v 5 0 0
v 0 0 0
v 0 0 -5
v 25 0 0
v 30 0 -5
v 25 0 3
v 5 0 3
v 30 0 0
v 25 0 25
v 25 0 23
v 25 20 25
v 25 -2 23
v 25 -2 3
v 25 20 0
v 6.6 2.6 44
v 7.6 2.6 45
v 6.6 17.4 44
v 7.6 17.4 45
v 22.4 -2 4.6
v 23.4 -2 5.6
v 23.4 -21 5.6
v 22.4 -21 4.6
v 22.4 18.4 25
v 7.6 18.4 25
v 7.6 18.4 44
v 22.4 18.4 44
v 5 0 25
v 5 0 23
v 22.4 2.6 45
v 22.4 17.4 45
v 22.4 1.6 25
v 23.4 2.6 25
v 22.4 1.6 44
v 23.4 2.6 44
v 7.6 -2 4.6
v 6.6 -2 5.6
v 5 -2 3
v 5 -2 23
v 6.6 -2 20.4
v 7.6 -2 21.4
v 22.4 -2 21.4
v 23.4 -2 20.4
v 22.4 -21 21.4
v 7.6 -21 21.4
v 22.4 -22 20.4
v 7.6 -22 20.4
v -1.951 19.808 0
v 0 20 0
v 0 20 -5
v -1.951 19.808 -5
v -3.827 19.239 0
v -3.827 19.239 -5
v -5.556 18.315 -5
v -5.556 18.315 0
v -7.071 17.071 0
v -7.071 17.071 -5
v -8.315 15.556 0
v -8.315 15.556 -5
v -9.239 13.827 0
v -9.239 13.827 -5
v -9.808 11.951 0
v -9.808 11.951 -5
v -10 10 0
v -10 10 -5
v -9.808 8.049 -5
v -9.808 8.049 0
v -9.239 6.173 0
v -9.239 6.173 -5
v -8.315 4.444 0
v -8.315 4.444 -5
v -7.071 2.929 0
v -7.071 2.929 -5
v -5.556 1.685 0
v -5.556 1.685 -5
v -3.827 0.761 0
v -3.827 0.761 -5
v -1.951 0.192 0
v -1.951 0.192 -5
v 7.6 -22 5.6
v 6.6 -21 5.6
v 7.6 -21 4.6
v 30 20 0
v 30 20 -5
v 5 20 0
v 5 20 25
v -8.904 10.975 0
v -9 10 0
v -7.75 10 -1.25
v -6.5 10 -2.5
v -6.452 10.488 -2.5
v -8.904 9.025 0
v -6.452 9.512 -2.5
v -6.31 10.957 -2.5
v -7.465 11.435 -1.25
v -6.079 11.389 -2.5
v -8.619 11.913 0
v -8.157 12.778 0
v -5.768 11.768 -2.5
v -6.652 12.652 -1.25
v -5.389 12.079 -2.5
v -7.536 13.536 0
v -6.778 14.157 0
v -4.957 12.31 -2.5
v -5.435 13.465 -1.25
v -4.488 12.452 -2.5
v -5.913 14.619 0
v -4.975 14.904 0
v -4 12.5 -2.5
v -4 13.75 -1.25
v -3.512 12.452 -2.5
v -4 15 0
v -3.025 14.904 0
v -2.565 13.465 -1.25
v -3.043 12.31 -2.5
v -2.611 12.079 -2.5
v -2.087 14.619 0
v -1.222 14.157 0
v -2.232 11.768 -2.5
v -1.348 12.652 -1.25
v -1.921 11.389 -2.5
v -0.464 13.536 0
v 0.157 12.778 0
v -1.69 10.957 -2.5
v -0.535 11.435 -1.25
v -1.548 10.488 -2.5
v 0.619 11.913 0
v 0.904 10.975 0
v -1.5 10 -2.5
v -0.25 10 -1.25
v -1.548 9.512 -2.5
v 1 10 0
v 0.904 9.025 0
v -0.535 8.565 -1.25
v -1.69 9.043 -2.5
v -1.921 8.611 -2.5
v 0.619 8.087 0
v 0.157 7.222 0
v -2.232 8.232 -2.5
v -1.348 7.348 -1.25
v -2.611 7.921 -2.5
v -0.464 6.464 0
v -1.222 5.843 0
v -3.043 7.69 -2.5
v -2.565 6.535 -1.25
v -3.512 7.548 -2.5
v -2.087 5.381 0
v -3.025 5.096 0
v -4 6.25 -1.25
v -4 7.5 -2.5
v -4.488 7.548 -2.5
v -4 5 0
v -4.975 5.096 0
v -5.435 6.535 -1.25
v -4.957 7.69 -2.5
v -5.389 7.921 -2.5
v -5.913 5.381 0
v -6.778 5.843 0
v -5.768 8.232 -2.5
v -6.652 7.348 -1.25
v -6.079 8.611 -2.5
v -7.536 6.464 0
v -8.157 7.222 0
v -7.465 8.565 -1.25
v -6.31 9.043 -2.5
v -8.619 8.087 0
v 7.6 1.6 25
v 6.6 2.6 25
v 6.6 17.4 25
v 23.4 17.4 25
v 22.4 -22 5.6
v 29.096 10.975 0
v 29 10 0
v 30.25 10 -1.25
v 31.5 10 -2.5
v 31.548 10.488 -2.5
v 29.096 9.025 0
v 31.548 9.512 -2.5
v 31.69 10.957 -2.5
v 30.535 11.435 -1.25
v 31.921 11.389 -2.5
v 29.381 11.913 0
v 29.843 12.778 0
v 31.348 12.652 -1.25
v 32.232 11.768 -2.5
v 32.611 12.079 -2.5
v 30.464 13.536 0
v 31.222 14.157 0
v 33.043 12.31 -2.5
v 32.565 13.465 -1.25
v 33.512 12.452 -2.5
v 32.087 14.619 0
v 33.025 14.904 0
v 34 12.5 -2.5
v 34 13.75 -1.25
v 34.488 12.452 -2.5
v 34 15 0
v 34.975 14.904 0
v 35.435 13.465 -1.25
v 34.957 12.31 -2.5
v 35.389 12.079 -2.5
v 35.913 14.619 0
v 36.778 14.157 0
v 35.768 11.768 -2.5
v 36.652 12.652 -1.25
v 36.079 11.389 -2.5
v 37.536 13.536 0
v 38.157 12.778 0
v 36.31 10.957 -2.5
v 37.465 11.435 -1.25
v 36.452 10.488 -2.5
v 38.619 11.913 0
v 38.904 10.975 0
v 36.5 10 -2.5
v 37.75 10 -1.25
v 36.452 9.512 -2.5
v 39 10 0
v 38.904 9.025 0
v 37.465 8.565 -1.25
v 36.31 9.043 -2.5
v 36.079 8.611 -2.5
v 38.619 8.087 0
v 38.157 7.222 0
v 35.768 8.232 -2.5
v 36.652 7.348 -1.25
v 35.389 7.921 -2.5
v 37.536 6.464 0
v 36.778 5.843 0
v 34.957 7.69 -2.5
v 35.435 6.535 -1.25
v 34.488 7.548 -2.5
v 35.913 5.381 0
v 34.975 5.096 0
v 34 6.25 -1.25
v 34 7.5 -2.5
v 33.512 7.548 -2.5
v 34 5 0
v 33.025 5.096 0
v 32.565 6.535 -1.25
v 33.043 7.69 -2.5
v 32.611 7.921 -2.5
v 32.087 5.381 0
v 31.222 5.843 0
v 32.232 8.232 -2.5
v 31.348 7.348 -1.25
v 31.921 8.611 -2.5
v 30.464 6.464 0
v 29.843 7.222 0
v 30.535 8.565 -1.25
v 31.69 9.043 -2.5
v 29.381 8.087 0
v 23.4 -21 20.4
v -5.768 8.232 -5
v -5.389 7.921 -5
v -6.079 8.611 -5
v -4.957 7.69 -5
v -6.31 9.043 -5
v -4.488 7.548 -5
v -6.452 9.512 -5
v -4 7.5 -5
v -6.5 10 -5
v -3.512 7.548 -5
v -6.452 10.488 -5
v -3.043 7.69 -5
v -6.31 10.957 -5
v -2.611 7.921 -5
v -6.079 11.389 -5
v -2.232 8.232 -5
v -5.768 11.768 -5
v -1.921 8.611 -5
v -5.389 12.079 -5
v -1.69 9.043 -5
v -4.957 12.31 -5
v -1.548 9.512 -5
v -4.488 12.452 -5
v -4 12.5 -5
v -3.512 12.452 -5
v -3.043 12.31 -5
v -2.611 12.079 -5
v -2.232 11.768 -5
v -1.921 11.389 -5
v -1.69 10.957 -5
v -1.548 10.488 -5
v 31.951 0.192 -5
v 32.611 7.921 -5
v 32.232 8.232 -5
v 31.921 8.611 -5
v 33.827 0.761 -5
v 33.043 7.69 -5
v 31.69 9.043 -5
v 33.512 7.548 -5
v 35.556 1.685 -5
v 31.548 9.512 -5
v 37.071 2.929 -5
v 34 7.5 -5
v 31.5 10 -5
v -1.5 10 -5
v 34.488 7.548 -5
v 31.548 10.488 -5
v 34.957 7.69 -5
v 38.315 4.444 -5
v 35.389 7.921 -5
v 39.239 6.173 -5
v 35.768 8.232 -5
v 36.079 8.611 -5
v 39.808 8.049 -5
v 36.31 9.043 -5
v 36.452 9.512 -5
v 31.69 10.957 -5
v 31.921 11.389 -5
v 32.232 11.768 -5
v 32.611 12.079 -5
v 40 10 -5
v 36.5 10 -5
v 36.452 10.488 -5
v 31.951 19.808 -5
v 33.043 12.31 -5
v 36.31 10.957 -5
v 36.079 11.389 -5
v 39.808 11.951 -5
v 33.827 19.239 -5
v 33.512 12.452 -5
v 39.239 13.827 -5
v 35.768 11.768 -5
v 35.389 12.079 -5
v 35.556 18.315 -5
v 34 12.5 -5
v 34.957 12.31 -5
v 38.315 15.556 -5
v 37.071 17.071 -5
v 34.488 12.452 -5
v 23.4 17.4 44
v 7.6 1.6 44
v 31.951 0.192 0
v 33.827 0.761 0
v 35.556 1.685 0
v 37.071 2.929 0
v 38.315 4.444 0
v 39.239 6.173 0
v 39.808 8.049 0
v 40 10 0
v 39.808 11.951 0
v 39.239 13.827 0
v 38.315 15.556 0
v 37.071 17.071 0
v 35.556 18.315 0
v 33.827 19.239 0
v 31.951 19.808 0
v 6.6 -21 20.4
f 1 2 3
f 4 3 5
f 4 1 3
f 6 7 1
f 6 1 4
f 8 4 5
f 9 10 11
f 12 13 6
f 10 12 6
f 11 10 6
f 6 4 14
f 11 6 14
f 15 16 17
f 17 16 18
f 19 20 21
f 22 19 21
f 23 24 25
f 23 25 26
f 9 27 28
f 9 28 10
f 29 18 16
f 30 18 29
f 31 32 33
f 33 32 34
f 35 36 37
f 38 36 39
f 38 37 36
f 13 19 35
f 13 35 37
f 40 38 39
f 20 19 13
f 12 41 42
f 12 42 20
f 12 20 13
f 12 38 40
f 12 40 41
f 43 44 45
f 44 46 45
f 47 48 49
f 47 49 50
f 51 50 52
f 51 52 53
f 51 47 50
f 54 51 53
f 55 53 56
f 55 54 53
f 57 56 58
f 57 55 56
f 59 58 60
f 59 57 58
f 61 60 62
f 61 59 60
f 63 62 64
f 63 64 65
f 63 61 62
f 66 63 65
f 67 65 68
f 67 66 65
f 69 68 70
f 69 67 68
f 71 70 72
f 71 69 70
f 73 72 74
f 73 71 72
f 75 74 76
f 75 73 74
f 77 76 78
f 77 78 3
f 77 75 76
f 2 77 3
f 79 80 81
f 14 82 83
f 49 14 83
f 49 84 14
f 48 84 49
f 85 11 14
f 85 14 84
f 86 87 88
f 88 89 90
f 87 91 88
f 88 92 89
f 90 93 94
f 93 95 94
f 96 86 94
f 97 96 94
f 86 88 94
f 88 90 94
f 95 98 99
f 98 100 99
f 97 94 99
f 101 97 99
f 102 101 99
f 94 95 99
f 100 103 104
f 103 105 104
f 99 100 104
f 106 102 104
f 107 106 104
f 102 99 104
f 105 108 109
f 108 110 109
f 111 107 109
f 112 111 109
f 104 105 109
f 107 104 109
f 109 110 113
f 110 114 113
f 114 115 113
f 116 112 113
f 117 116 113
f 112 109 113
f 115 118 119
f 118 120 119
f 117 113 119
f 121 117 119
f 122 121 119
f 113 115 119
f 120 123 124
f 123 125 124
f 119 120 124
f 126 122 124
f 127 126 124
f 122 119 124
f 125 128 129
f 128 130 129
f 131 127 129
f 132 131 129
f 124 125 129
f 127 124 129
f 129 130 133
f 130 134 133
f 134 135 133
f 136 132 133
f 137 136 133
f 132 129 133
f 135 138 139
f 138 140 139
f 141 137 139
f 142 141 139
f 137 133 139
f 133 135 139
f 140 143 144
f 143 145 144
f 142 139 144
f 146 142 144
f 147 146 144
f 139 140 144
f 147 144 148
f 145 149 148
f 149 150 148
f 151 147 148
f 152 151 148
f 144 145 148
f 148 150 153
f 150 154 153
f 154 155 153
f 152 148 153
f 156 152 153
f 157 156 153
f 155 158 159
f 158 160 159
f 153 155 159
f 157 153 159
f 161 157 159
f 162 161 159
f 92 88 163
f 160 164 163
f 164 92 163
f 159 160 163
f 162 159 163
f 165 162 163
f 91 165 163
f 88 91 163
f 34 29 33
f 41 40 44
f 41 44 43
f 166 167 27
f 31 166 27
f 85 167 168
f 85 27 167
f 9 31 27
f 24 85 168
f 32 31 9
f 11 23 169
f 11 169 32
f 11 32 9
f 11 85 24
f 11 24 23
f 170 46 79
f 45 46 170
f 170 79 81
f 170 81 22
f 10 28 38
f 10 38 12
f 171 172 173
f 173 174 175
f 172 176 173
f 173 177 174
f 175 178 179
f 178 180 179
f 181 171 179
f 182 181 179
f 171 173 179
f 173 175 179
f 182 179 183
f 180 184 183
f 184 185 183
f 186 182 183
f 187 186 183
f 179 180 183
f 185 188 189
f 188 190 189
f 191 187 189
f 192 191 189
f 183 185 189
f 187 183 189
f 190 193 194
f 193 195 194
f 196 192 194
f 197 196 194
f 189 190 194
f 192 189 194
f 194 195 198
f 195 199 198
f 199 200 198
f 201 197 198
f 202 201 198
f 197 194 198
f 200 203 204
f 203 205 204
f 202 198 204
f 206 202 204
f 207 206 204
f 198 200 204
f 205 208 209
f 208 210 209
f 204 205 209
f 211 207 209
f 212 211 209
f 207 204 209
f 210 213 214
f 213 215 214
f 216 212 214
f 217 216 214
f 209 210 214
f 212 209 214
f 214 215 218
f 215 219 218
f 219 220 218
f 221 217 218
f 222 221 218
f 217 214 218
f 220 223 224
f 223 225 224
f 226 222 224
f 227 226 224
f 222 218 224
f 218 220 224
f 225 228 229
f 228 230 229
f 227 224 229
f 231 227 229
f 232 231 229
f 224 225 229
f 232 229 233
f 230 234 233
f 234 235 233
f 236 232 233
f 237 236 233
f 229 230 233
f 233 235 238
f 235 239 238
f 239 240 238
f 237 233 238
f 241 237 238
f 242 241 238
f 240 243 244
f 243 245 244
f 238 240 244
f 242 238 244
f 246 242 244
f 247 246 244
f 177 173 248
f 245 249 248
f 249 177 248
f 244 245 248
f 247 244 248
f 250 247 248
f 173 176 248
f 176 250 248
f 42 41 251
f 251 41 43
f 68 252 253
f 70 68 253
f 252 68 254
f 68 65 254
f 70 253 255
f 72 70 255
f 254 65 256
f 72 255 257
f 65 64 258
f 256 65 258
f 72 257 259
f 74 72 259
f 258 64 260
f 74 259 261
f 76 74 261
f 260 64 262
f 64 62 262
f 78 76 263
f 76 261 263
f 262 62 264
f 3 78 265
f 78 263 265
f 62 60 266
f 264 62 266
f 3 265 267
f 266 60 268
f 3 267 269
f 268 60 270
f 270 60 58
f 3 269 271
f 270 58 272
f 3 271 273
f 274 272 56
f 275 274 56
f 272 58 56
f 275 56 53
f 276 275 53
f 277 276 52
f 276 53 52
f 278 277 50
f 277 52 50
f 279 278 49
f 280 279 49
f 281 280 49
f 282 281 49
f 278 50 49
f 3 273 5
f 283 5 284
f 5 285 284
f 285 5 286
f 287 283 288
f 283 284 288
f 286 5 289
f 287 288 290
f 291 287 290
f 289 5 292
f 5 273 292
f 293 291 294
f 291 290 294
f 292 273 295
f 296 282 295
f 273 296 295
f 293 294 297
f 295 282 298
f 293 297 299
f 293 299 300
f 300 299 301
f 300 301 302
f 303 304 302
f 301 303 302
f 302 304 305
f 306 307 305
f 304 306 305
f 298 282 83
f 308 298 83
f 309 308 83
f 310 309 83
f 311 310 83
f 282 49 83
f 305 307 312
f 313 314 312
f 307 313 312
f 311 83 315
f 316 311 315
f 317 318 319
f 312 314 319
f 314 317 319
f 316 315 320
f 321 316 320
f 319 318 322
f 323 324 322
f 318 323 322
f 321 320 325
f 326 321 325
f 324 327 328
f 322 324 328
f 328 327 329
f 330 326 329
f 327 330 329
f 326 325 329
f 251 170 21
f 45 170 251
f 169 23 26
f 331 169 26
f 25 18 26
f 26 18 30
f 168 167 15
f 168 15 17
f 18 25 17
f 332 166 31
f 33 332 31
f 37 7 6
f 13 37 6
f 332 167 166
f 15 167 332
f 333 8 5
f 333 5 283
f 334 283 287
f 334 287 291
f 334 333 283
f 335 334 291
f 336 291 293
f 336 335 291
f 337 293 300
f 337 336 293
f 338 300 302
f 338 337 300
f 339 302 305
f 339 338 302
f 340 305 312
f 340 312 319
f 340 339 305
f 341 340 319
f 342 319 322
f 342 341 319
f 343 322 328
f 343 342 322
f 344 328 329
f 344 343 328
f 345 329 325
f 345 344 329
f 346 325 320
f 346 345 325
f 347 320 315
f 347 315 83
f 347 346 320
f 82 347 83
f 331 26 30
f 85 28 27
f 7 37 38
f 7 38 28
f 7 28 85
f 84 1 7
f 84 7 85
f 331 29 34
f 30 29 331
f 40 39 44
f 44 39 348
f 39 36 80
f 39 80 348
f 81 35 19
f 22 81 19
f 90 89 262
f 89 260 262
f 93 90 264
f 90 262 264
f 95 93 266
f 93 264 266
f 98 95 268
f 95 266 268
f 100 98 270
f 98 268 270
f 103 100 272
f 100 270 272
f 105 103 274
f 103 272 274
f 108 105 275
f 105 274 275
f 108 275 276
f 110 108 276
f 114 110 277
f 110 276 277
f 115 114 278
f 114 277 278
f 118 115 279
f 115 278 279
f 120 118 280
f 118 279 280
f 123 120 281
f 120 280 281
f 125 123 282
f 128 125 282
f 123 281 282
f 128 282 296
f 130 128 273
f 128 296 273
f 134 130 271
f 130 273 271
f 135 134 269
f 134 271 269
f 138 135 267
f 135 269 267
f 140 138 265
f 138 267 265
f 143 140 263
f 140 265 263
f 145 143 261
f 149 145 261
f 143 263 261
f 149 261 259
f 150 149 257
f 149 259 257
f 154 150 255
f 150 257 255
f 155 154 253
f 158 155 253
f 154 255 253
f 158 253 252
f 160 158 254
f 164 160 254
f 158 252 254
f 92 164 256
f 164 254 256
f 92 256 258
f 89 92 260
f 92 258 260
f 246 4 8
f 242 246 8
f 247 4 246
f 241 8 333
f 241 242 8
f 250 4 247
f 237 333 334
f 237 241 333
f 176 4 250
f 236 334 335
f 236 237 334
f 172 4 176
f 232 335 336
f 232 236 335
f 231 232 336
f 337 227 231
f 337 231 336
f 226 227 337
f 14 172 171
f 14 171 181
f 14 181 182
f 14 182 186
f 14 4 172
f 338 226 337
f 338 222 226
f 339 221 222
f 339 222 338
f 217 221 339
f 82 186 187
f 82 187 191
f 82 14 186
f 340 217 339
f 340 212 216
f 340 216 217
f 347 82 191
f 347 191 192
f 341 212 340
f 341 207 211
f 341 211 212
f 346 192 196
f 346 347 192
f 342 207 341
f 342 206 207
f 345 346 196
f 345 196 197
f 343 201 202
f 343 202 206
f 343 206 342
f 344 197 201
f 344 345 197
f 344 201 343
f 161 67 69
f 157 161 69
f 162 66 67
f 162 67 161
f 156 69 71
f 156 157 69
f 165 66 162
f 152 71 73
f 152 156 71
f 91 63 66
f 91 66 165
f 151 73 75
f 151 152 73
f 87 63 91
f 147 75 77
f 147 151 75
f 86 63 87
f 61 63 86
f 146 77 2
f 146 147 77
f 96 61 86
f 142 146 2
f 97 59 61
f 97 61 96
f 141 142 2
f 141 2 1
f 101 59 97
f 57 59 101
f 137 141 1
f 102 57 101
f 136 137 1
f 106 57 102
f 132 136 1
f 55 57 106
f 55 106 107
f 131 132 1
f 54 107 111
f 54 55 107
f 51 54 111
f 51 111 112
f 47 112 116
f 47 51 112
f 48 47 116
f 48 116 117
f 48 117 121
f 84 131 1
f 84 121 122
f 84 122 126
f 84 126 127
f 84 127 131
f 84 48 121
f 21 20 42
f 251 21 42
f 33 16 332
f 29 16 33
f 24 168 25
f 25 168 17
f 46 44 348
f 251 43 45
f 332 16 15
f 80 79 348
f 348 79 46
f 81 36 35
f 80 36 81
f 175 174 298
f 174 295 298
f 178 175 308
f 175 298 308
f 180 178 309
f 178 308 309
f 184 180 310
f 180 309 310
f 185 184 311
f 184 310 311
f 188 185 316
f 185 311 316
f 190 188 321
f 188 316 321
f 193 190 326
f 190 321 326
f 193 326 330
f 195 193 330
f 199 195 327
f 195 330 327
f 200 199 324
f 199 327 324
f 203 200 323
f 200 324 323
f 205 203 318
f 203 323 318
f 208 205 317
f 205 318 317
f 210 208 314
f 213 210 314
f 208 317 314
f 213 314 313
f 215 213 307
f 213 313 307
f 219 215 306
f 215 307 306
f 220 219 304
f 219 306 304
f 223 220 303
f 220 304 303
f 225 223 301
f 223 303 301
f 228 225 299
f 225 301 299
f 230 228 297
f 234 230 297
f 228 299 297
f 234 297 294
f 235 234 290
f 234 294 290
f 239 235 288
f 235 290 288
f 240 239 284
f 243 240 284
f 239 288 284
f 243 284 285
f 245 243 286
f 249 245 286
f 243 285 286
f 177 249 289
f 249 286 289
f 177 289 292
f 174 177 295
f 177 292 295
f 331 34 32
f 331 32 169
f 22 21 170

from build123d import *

# Parameters (mm, degrees)
F0_W            = 20
F0_H            = 20
F1_DEPTH        = 25
F0_W_2          = 5
F2_DEPTH        = 5
F3_W            = 16.8
F3_H            = 16.8
F4_DEPTH        = 20
F5_W            = 20
F5_H            = 20
F6_DEPTH        = 2
F7_SIZE         = 1
F8_W            = 16.8
F8_H            = 16.8
F9_DEPTH        = 20
F10_SIZE        = 1
F11_D           = 5
F11_CSINK_D     = 10
F11_CSINK_ANGLE = 90


with BuildPart() as f1:
    # F0 (on Top) → F1 (new body)
    with BuildSketch(Plane.XY):
        with Locations((15, 10)):
            Rectangle(F0_W, F0_H)
    extrude(amount=F1_DEPTH)

    # F0 (on Top) → F2 (join)
    with BuildSketch(Plane.XY):
        with Locations((2.5, 10)):
            Rectangle(F0_W_2, F0_H)
        with BuildLine():
            ThreePointArc((0, 20), (-10, 10), (0, 0))
            Line((0, 0), (0, 20))
        make_face()
        with Locations((15, 10)):
            Rectangle(F0_W, F0_H)
        with Locations((27.5, 10)):
            Rectangle(F0_W_2, F0_H)
        with BuildLine():
            Line((30, 20), (30, 0))
            ThreePointArc((30, 0), (40, 10), (30, 20))
        make_face()
    extrude(amount=-F2_DEPTH)

    # F3 (on face) → F4 (join)
    with BuildSketch(Plane.XY.offset(25)):
        with Locations((15, 10)):
            Rectangle(F3_W, F3_H)
    extrude(amount=F4_DEPTH)

    # F5 (on face) → F6 (join)
    with BuildSketch(Plane.XZ):
        with Locations((15, 13)):
            Rectangle(F5_W, F5_H)
    extrude(amount=F6_DEPTH)

    # F7
    f7_edges = [f1.edges().sort_by_distance(p)[0] for p in [
        (23.4, 18.4, 35),
        (6.6, 18.4, 35),
        (15, 18.4, 45),
        (6.6, 10, 45),
        (23.4, 10, 45),
        (15, 1.6, 45),
        (23.4, 1.6, 35),
        (6.6, 1.6, 35),
    ]]
    chamfer(f7_edges, length=F7_SIZE)

    # F8 (on face) → F9 (join)
    with BuildSketch(Plane.XZ.offset(2)):
        with Locations((15, 13)):
            Rectangle(F8_W, F8_H)
    extrude(amount=F9_DEPTH)

    # F10
    f10_edges = [f1.edges().sort_by_distance(p)[0] for p in [
        (23.4, -12, 21.4),
        (15, -22, 21.4),
        (6.6, -12, 21.4),
        (23.4, -22, 13),
        (23.4, -12, 4.6),
        (6.6, -12, 4.6),
        (6.6, -22, 13),
        (15, -22, 4.6),
    ]]
    chamfer(f10_edges, length=F10_SIZE)

    # F11 (through all)
    with Locations(Plane.XY):
        with Locations((-4, 10), (34, 10)):
            CounterSinkHole(F11_D / 2, F11_CSINK_D / 2, counter_sink_angle=F11_CSINK_ANGLE)


solid = f1.part
